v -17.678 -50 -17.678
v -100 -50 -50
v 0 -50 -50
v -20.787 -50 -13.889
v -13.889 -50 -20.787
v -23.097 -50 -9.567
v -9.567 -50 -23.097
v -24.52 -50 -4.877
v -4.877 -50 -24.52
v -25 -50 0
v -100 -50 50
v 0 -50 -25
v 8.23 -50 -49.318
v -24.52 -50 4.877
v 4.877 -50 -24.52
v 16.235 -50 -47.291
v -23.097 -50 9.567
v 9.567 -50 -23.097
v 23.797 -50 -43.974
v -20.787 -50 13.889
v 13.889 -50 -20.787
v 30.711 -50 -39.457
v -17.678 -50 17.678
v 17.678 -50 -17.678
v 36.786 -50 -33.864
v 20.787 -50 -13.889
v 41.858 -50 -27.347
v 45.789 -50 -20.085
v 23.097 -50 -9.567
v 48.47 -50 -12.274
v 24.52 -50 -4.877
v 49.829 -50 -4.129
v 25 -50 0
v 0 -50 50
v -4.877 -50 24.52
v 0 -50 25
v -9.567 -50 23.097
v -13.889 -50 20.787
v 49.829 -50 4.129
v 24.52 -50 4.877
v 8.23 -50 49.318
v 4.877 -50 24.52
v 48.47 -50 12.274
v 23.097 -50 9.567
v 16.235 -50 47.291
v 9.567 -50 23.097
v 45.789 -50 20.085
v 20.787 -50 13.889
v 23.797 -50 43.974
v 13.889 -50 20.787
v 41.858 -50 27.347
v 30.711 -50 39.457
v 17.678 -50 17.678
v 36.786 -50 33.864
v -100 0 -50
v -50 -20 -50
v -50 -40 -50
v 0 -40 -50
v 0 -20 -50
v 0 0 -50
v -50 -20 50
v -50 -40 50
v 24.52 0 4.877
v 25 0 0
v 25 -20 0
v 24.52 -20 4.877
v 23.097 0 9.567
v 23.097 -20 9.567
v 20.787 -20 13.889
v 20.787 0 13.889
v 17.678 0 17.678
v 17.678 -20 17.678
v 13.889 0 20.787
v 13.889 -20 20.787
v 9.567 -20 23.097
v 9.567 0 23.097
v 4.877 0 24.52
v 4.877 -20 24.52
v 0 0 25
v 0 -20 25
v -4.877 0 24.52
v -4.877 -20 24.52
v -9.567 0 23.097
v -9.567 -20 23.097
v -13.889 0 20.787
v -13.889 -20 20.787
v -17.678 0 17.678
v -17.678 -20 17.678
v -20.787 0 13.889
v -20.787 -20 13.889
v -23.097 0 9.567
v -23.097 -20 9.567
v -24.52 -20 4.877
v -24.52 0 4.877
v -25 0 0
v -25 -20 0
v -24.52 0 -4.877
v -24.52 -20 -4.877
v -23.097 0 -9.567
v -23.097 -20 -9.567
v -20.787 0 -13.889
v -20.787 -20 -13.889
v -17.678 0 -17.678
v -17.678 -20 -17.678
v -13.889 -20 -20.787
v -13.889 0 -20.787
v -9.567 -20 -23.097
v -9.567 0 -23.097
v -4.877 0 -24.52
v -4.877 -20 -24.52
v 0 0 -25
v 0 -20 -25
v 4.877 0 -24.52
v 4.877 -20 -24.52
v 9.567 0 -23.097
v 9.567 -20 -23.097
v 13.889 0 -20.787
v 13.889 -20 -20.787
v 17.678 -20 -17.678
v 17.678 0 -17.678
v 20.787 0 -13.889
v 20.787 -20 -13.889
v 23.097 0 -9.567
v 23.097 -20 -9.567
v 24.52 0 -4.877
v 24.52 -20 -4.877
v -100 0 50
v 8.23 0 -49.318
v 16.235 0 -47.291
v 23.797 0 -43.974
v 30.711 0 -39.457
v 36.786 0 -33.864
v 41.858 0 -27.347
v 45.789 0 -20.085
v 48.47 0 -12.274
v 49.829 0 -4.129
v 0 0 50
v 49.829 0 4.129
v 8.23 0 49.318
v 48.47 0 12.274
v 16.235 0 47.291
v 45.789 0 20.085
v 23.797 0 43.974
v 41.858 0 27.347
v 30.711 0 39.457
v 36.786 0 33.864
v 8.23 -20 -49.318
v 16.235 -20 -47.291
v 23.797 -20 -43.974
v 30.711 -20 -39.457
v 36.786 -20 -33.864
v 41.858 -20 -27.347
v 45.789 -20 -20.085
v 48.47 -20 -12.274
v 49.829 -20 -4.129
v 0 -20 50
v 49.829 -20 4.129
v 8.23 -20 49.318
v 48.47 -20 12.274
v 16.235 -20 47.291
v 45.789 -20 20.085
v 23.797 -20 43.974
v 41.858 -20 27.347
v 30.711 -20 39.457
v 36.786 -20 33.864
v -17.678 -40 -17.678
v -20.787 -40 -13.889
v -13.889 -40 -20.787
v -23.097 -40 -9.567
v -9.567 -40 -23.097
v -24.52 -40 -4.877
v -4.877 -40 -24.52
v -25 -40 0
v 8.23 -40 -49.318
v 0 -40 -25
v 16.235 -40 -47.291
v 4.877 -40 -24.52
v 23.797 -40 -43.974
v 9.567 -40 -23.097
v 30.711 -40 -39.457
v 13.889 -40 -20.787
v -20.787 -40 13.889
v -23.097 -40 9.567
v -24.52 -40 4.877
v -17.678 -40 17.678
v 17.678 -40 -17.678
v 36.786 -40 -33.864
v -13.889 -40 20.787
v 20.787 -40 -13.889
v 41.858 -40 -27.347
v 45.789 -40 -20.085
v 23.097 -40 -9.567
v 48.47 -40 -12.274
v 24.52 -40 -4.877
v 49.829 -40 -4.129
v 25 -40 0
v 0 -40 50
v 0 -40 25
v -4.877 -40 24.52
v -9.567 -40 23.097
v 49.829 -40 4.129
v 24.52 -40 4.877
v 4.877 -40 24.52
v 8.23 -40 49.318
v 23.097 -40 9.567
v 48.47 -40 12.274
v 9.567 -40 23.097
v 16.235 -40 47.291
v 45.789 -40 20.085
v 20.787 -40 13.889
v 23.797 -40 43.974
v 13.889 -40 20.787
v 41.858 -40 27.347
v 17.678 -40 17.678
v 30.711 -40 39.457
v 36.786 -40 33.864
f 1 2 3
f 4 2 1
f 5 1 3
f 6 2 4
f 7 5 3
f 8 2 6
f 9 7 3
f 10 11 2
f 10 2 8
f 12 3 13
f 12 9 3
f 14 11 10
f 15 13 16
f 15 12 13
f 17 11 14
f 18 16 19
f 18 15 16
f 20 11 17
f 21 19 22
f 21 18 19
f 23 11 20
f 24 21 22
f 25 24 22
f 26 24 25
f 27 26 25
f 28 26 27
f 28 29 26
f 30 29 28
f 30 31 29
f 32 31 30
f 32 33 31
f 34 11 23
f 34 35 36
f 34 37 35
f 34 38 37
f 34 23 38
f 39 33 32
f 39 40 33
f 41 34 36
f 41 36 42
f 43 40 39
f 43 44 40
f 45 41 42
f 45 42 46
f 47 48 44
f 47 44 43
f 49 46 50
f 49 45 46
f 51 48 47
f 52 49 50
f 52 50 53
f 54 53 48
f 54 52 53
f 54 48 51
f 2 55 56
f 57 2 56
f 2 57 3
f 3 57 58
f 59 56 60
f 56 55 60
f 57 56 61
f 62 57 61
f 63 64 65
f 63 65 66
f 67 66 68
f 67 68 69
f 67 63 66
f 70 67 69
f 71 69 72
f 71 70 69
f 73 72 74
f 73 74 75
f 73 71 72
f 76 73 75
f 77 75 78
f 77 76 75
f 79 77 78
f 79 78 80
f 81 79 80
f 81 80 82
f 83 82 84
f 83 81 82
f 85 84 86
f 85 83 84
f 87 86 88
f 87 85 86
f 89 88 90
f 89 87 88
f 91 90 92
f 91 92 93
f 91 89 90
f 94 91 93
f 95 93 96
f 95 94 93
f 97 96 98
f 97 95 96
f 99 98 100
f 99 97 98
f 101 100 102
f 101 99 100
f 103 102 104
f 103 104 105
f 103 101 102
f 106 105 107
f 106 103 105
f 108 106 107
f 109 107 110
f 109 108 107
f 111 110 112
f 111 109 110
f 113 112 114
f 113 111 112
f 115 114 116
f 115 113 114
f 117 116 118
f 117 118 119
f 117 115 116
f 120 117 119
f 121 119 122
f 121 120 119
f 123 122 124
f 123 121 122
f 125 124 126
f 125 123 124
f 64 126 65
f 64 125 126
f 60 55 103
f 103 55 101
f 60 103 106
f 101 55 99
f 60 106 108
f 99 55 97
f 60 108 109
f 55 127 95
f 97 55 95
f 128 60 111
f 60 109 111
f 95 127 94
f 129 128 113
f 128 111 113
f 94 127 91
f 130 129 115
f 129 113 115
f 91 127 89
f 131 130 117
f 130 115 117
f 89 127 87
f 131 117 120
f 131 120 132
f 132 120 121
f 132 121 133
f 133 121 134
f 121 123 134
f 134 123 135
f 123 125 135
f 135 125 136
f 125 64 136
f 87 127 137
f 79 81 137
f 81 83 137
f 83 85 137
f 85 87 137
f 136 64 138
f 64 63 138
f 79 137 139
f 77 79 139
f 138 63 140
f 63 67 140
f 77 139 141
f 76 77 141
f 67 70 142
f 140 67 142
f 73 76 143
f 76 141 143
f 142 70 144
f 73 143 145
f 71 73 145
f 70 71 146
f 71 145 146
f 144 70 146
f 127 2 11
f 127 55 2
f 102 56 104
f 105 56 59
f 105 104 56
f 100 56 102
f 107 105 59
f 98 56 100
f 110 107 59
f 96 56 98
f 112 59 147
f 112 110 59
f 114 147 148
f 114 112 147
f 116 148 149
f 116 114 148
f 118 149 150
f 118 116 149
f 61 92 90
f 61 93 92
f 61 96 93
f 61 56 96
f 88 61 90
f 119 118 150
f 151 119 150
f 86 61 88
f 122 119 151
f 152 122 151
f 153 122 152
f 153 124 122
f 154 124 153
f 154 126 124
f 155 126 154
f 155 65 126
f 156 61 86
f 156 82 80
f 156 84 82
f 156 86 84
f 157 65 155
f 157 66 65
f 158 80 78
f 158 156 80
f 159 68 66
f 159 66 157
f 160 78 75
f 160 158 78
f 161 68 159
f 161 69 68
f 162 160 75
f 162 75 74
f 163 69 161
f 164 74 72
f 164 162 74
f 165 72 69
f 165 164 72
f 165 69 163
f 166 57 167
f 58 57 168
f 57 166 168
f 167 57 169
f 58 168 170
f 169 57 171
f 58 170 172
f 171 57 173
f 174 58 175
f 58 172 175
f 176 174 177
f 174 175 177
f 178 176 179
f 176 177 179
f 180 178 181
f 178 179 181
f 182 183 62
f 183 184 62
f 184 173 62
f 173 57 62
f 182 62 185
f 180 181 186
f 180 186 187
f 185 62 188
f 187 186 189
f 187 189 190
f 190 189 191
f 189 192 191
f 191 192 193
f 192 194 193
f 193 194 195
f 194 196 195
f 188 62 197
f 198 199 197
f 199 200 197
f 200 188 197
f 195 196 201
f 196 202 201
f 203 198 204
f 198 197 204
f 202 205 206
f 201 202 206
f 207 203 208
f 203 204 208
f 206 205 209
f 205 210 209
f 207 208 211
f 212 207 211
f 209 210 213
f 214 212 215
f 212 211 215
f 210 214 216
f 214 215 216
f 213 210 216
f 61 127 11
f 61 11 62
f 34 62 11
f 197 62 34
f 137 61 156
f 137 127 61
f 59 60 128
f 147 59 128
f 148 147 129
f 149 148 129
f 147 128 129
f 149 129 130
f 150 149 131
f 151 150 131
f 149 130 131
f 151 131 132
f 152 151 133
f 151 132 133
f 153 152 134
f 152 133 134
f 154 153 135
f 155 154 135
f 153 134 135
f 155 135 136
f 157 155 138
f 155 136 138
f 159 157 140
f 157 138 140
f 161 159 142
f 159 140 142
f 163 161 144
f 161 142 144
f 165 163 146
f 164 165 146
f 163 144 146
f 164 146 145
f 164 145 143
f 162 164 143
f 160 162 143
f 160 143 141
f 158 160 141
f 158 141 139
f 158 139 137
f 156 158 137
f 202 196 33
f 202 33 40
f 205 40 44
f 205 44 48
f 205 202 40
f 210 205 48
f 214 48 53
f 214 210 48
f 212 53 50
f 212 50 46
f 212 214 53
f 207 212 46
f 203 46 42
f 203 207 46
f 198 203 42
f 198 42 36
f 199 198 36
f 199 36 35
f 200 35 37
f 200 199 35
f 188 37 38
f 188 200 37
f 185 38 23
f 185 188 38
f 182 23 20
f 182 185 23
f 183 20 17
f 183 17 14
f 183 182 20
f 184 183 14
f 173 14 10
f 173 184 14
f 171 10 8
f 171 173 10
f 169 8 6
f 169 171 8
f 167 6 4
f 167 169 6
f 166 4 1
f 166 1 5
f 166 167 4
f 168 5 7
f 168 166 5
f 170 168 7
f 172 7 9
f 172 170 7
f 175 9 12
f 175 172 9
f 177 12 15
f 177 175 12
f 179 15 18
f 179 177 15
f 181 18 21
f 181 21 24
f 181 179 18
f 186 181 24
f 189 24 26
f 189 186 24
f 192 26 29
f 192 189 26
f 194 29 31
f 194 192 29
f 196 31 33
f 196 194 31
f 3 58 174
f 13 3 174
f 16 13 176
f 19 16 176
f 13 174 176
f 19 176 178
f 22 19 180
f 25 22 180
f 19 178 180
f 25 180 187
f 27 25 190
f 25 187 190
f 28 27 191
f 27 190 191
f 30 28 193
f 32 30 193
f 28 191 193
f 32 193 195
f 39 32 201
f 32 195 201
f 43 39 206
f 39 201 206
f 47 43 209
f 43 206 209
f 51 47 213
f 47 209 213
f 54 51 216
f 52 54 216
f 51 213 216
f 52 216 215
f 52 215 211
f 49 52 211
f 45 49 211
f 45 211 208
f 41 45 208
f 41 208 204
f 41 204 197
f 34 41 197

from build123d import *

# Parameters (mm, degrees)
F0_R     = 25
F1_DEPTH = 20
F3_R     = 25
F4_DEPTH = 10
F5_W     = 50
F5_H     = 100
F6_DEPTH = 20


with BuildPart() as f1:
    # F0 (on Front) → F1 (new body)
    with BuildSketch(Plane.XZ):
        with BuildLine():
            Line((-100, -50), (0, -50))
            ThreePointArc((0, -50), (50, 0), (0, 50))
            Line((0, 50), (-100, 50))
            Line((-100, 50), (-100, -50))
        make_face()
        Circle(F0_R, mode=Mode.SUBTRACT)
    extrude(amount=F1_DEPTH)



with BuildPart() as f4:
    # F3 (on offset) → F4 (new body)
    with BuildSketch(Plane.XZ.offset(40)):
        with BuildLine():
            Line((-100, 50), (-100, -50))
            Line((-100, -50), (0, -50))
            ThreePointArc((0, -50), (50, 0), (0, 50))
            Line((0, 50), (-100, 50))
        make_face()
        Circle(F3_R, mode=Mode.SUBTRACT)
    extrude(amount=F4_DEPTH)


with BuildPart() as f1_1:
    add(f1.part)

    add(f4.part)  # F6 merges F4
    # F5 (on face) → F6 (join, through all)
    with BuildSketch(Plane.XZ.offset(20)):
        with Locations((-75, 0)):
            Rectangle(F5_W, F5_H)
    extrude(amount=F6_DEPTH)


solid = f1_1.part
